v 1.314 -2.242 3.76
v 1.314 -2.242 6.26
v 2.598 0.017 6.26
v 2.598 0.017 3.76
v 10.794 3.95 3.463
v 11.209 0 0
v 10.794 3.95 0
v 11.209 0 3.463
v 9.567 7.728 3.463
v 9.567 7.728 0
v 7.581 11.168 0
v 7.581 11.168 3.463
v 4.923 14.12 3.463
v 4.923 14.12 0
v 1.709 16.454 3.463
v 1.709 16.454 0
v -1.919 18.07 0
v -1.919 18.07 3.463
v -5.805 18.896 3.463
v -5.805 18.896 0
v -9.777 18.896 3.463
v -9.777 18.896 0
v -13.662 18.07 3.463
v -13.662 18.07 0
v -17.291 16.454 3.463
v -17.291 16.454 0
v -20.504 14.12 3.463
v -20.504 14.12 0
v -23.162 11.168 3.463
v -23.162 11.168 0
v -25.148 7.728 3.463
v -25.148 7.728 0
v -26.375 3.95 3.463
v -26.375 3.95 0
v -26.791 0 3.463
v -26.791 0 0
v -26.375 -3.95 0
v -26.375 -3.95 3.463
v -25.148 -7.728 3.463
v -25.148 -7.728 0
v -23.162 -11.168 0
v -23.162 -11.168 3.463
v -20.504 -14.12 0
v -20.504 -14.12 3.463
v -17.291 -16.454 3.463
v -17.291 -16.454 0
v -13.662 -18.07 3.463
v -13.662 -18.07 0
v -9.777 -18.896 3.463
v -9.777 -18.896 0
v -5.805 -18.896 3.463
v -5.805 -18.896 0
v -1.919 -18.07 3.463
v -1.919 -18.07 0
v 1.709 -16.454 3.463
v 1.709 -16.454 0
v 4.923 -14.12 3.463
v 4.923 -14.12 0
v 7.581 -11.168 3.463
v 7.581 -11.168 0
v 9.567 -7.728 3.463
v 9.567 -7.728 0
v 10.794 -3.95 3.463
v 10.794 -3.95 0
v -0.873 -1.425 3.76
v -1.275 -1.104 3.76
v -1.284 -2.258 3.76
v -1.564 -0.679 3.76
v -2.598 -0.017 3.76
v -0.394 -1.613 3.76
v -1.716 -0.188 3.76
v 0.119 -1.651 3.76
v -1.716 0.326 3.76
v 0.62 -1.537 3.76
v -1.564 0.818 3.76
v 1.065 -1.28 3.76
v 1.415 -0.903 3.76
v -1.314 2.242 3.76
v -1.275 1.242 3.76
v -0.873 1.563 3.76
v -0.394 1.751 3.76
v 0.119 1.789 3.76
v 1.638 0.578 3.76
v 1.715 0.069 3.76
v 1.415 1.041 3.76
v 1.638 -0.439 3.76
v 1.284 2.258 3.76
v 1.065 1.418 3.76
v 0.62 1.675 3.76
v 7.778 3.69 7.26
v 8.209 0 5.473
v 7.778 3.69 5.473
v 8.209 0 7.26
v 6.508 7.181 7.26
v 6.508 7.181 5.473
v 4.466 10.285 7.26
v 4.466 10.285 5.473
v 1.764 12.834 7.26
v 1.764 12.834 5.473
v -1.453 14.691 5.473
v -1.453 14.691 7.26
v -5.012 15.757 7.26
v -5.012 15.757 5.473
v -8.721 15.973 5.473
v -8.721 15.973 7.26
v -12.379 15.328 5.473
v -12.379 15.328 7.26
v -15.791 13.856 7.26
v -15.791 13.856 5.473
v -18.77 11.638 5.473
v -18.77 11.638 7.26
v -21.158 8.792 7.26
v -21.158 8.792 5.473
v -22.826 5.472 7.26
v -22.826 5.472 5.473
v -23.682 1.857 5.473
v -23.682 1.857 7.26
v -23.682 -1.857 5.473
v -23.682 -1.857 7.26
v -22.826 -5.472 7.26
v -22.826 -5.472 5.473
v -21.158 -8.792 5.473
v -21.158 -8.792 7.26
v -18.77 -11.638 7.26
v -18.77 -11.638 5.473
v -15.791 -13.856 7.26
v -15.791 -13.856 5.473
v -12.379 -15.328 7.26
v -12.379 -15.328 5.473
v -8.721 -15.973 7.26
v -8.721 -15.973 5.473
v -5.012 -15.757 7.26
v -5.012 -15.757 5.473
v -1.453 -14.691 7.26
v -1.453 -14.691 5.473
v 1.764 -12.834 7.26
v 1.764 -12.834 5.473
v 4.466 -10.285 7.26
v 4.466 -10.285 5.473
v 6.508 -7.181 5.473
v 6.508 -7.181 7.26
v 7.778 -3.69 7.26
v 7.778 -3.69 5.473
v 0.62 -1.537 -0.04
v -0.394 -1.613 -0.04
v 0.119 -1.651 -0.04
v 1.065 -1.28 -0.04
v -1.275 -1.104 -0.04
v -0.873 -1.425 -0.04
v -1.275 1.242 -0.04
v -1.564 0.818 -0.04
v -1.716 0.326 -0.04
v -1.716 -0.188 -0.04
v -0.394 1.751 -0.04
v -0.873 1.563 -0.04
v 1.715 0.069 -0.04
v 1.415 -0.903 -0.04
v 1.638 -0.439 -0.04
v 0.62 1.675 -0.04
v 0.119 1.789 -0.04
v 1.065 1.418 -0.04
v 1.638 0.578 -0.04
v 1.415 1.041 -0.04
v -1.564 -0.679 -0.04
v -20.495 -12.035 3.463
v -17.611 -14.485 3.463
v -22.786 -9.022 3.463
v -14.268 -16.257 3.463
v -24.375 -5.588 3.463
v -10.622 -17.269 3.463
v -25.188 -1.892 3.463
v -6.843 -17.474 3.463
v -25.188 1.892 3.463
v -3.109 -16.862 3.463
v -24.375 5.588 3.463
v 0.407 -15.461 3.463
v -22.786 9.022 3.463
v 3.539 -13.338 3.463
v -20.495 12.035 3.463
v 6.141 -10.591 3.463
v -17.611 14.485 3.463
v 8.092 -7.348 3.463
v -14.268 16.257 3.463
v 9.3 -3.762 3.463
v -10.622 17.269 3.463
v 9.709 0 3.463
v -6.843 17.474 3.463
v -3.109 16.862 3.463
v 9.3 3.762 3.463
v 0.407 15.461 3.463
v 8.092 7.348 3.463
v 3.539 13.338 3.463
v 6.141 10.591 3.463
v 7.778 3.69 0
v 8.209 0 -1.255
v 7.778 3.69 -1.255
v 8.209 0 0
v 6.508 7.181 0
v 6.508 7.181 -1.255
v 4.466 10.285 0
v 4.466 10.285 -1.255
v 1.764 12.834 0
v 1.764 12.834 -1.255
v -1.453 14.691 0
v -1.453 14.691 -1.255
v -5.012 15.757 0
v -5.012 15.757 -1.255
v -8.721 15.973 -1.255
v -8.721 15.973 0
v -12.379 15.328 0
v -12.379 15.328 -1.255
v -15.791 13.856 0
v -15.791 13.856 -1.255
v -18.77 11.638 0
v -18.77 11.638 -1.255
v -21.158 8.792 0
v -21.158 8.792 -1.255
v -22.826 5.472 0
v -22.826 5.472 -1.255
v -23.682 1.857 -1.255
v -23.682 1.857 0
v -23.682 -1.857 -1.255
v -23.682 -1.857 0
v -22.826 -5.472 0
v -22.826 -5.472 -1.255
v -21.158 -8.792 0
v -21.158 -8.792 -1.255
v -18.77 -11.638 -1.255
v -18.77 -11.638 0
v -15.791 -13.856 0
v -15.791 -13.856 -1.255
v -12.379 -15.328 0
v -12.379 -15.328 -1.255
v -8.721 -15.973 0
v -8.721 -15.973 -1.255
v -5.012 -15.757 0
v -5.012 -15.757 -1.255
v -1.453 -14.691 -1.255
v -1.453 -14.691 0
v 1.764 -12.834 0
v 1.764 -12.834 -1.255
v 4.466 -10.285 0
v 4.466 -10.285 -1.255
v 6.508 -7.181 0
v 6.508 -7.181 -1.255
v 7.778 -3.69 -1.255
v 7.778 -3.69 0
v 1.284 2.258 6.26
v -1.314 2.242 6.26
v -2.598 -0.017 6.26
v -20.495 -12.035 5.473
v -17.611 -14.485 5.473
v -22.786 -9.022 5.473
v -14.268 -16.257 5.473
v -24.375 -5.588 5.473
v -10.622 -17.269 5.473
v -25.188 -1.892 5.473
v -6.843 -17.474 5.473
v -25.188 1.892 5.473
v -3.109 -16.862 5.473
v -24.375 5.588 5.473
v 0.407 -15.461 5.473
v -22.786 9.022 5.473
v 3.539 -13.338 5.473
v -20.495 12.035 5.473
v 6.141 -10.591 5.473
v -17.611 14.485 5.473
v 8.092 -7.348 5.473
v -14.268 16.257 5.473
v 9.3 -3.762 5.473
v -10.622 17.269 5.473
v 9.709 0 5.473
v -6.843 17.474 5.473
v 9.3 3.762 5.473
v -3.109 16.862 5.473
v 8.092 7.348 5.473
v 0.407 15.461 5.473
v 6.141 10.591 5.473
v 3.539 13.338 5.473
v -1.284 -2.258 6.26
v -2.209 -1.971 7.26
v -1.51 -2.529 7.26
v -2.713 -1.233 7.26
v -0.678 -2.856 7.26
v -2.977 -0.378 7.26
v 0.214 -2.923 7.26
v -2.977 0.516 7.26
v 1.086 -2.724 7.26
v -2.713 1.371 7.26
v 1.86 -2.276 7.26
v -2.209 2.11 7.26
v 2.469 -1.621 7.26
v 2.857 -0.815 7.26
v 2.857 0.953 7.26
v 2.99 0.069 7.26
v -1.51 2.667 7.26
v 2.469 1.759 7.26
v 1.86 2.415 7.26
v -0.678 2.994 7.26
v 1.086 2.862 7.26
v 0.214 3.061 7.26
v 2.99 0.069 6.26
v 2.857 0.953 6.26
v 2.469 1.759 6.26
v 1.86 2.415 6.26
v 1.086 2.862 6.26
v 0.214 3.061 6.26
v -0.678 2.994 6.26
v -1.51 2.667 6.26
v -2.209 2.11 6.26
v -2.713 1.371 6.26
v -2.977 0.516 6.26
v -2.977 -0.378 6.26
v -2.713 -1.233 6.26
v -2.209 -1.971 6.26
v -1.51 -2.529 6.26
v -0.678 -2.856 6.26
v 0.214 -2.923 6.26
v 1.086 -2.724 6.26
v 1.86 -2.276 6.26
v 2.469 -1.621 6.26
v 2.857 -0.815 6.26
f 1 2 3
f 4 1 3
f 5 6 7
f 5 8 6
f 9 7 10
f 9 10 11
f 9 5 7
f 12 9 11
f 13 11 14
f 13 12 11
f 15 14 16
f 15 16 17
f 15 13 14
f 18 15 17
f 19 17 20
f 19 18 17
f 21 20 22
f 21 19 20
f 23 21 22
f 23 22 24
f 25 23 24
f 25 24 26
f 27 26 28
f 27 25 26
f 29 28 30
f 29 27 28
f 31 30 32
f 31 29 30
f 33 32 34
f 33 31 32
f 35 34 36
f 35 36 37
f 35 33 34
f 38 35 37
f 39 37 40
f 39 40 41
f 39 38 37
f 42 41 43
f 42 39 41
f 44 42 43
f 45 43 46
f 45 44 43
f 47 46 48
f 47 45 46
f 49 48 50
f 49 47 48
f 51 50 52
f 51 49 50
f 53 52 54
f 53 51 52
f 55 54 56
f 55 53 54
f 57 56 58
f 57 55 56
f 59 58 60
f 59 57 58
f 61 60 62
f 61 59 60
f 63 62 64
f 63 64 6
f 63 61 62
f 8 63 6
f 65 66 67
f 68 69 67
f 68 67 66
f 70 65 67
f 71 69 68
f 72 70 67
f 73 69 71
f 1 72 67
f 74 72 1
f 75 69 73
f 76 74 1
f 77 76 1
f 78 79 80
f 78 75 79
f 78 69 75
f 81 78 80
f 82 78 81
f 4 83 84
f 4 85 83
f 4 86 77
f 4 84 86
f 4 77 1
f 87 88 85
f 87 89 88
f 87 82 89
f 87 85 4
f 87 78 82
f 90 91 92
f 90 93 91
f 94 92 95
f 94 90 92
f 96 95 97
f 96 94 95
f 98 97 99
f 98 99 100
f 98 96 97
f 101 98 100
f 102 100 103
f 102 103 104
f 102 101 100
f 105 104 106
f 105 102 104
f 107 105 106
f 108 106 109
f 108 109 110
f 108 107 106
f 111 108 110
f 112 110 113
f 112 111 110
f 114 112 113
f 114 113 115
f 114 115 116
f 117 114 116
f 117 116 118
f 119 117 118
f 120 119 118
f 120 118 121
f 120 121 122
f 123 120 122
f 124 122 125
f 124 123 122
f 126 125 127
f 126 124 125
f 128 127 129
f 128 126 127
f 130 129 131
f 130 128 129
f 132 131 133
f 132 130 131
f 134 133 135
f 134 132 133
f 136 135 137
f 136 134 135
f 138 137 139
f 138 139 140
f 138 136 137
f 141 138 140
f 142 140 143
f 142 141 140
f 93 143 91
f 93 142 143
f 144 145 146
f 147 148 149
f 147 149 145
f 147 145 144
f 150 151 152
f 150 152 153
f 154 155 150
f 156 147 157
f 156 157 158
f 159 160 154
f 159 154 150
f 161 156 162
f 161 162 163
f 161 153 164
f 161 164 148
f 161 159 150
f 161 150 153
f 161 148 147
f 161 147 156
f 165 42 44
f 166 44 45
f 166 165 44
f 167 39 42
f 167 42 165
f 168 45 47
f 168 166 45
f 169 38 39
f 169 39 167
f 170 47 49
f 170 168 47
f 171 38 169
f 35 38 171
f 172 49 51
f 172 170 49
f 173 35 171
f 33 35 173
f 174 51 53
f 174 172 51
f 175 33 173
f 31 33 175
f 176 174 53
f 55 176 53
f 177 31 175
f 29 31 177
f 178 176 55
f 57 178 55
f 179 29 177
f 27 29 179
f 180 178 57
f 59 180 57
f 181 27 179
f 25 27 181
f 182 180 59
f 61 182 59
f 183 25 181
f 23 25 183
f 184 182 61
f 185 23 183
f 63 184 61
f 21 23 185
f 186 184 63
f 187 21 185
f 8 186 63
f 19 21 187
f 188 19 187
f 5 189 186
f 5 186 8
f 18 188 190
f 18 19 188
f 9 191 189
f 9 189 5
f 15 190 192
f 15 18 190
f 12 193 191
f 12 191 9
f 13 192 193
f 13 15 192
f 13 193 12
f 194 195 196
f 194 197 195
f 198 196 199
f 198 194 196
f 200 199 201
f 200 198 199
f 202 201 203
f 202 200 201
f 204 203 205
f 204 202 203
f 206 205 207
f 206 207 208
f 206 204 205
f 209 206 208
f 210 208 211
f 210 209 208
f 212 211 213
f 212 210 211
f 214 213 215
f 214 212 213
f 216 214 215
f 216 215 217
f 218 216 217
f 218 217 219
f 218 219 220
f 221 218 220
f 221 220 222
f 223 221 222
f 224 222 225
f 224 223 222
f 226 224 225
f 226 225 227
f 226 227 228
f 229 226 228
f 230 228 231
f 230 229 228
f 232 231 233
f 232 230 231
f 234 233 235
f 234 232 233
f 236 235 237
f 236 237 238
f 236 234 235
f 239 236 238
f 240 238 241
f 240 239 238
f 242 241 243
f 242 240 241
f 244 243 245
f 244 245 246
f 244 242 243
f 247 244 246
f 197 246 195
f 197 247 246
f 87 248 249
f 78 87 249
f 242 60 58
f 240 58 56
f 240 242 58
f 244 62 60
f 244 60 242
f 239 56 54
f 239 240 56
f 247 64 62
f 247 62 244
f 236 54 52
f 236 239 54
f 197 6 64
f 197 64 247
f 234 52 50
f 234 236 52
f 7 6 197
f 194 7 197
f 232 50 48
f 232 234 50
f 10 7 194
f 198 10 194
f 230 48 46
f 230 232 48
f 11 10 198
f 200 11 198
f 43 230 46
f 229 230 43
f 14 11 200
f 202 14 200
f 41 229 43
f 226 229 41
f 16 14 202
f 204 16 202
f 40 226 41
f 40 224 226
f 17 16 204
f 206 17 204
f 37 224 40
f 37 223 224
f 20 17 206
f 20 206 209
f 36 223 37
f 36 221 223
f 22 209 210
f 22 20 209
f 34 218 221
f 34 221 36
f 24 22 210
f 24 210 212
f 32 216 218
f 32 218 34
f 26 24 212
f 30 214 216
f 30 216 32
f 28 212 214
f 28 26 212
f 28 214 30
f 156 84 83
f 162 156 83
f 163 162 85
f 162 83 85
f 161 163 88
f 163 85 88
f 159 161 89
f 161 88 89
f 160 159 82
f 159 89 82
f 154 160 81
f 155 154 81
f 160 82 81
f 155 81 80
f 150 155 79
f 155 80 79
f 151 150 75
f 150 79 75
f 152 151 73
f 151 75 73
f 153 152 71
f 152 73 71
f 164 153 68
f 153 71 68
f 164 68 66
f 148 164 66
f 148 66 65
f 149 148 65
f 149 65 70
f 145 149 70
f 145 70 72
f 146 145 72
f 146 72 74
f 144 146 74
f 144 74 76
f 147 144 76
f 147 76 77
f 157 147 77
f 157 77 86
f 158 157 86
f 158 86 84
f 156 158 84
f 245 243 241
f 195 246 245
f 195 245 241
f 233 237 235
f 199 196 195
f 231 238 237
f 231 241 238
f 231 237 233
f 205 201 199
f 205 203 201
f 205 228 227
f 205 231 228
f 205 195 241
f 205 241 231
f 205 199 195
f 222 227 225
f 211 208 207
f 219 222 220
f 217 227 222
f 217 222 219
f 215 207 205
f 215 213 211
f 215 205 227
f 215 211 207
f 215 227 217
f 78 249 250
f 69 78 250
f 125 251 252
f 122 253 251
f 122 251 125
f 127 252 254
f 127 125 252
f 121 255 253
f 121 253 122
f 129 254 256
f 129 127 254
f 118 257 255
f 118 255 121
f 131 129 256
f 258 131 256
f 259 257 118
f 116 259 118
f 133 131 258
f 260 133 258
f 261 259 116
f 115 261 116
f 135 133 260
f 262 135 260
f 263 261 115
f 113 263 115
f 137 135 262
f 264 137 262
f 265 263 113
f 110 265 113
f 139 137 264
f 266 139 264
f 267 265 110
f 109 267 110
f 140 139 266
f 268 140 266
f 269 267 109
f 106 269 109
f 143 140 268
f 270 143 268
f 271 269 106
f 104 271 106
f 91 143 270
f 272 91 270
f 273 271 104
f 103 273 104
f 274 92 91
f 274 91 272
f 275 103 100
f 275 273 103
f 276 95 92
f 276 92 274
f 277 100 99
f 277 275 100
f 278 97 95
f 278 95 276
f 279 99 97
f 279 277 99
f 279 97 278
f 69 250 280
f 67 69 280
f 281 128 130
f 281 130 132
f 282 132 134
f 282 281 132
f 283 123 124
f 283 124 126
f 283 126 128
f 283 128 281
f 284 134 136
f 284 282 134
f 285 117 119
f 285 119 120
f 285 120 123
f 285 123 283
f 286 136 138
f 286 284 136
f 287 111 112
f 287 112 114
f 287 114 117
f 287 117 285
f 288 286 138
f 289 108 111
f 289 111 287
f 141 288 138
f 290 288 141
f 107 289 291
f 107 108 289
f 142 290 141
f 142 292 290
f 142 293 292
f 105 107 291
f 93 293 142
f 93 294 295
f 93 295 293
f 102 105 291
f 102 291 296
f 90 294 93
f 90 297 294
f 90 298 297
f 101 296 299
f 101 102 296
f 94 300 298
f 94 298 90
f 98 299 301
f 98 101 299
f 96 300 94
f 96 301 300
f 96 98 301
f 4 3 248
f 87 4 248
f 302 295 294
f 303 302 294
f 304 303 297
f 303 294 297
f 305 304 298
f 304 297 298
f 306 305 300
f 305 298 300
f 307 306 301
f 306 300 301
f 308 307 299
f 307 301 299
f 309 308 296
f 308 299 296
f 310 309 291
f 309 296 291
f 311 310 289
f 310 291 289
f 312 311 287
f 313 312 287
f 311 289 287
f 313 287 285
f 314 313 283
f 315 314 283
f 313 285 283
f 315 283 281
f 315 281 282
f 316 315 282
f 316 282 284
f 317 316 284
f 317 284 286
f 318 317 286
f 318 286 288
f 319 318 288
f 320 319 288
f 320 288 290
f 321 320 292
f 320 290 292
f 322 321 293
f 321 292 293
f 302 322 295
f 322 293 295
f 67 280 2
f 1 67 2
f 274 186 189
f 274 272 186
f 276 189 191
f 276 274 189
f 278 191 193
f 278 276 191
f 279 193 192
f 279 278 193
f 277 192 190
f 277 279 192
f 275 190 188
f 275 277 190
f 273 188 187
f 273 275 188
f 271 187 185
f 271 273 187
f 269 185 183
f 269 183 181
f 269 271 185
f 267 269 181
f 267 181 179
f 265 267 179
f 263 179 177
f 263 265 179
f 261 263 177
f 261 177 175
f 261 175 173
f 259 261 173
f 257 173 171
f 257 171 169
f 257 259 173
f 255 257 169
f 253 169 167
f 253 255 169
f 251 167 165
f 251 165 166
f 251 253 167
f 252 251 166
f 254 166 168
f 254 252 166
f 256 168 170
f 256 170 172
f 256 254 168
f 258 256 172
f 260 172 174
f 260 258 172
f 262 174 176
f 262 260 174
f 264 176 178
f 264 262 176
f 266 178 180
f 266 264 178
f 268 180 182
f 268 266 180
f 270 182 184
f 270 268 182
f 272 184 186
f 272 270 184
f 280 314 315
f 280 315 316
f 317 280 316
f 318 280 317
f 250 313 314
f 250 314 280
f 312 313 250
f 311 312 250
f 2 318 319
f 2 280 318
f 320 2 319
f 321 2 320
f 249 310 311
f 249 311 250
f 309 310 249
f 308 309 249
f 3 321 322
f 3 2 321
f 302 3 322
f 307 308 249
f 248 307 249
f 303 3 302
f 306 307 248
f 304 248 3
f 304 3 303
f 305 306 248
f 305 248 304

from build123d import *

# Parameters (mm, degrees)
F0_W     = 16
F0_H     = 1.2547565785
F3_R     = 1.725
F4_DEPTH = 7.3
F5_DEPTH = 3.5
F3_R_2   = 3
F6_DEPTH = 1


with BuildPart() as f1:
    # F0 (on Front) → F1 (revolve)
    with BuildSketch(Plane.XZ):
        Polygon((-7.7905750729, 7.2604851217), (-7.7905750729, 0), (8.2094249271, 0), (11.2094249271, 0), (11.2094249271, 3.4629283439), (9.7094249271, 3.4629283439), (9.7094249271, 5.4733994966), (8.2094249271, 5.4733994966), (8.2094249271, 7.2604851217), align=None)
        with Locations((0.2094249271, -0.6273782892)):
            Rectangle(F0_W, F0_H)
    revolve(axis=Axis((-7.7905750729, 0, 2.7390308408), (0, 0, 1)))

    # F3 (on offset) → F4 (cut)
    with BuildSketch(Plane.XY.offset(7.2604851217)):
        with Locations((-0.0100255911, 0.0691023806)):
            Circle(F3_R)
    extrude(amount=-F4_DEPTH, mode=Mode.SUBTRACT)

    # F3 (on offset) → F5 (cut)
    with BuildSketch(Plane.XY.offset(7.2604851217)):
        Polygon((-1.3136138991, 2.2415214753), (-2.5980214903, -0.0168622697), (-1.2844075912, -2.258383745), (1.3136138991, -2.2415214753), (2.5980214903, 0.0168622697), (1.2844075912, 2.258383745), align=None)
        with Locations((-0.0100255911, 0.0691023806)):
            Circle(F3_R, mode=Mode.SUBTRACT)
    extrude(amount=-F5_DEPTH, mode=Mode.SUBTRACT)

    # F3 (on offset) → F6 (cut)
    with BuildSketch(Plane.XY.offset(7.2604851217)):
        with Locations((-0.0100255911, 0.0691023806)):
            Circle(F3_R_2)
        Polygon((-1.2844075912, -2.258383745), (-2.5980214903, -0.0168622697), (-1.3136138991, 2.2415214753), (1.2844075912, 2.258383745), (2.5980214903, 0.0168622697), (1.3136138991, -2.2415214753), align=None, mode=Mode.SUBTRACT)
    extrude(amount=-F6_DEPTH, mode=Mode.SUBTRACT)


solid = f1.part
